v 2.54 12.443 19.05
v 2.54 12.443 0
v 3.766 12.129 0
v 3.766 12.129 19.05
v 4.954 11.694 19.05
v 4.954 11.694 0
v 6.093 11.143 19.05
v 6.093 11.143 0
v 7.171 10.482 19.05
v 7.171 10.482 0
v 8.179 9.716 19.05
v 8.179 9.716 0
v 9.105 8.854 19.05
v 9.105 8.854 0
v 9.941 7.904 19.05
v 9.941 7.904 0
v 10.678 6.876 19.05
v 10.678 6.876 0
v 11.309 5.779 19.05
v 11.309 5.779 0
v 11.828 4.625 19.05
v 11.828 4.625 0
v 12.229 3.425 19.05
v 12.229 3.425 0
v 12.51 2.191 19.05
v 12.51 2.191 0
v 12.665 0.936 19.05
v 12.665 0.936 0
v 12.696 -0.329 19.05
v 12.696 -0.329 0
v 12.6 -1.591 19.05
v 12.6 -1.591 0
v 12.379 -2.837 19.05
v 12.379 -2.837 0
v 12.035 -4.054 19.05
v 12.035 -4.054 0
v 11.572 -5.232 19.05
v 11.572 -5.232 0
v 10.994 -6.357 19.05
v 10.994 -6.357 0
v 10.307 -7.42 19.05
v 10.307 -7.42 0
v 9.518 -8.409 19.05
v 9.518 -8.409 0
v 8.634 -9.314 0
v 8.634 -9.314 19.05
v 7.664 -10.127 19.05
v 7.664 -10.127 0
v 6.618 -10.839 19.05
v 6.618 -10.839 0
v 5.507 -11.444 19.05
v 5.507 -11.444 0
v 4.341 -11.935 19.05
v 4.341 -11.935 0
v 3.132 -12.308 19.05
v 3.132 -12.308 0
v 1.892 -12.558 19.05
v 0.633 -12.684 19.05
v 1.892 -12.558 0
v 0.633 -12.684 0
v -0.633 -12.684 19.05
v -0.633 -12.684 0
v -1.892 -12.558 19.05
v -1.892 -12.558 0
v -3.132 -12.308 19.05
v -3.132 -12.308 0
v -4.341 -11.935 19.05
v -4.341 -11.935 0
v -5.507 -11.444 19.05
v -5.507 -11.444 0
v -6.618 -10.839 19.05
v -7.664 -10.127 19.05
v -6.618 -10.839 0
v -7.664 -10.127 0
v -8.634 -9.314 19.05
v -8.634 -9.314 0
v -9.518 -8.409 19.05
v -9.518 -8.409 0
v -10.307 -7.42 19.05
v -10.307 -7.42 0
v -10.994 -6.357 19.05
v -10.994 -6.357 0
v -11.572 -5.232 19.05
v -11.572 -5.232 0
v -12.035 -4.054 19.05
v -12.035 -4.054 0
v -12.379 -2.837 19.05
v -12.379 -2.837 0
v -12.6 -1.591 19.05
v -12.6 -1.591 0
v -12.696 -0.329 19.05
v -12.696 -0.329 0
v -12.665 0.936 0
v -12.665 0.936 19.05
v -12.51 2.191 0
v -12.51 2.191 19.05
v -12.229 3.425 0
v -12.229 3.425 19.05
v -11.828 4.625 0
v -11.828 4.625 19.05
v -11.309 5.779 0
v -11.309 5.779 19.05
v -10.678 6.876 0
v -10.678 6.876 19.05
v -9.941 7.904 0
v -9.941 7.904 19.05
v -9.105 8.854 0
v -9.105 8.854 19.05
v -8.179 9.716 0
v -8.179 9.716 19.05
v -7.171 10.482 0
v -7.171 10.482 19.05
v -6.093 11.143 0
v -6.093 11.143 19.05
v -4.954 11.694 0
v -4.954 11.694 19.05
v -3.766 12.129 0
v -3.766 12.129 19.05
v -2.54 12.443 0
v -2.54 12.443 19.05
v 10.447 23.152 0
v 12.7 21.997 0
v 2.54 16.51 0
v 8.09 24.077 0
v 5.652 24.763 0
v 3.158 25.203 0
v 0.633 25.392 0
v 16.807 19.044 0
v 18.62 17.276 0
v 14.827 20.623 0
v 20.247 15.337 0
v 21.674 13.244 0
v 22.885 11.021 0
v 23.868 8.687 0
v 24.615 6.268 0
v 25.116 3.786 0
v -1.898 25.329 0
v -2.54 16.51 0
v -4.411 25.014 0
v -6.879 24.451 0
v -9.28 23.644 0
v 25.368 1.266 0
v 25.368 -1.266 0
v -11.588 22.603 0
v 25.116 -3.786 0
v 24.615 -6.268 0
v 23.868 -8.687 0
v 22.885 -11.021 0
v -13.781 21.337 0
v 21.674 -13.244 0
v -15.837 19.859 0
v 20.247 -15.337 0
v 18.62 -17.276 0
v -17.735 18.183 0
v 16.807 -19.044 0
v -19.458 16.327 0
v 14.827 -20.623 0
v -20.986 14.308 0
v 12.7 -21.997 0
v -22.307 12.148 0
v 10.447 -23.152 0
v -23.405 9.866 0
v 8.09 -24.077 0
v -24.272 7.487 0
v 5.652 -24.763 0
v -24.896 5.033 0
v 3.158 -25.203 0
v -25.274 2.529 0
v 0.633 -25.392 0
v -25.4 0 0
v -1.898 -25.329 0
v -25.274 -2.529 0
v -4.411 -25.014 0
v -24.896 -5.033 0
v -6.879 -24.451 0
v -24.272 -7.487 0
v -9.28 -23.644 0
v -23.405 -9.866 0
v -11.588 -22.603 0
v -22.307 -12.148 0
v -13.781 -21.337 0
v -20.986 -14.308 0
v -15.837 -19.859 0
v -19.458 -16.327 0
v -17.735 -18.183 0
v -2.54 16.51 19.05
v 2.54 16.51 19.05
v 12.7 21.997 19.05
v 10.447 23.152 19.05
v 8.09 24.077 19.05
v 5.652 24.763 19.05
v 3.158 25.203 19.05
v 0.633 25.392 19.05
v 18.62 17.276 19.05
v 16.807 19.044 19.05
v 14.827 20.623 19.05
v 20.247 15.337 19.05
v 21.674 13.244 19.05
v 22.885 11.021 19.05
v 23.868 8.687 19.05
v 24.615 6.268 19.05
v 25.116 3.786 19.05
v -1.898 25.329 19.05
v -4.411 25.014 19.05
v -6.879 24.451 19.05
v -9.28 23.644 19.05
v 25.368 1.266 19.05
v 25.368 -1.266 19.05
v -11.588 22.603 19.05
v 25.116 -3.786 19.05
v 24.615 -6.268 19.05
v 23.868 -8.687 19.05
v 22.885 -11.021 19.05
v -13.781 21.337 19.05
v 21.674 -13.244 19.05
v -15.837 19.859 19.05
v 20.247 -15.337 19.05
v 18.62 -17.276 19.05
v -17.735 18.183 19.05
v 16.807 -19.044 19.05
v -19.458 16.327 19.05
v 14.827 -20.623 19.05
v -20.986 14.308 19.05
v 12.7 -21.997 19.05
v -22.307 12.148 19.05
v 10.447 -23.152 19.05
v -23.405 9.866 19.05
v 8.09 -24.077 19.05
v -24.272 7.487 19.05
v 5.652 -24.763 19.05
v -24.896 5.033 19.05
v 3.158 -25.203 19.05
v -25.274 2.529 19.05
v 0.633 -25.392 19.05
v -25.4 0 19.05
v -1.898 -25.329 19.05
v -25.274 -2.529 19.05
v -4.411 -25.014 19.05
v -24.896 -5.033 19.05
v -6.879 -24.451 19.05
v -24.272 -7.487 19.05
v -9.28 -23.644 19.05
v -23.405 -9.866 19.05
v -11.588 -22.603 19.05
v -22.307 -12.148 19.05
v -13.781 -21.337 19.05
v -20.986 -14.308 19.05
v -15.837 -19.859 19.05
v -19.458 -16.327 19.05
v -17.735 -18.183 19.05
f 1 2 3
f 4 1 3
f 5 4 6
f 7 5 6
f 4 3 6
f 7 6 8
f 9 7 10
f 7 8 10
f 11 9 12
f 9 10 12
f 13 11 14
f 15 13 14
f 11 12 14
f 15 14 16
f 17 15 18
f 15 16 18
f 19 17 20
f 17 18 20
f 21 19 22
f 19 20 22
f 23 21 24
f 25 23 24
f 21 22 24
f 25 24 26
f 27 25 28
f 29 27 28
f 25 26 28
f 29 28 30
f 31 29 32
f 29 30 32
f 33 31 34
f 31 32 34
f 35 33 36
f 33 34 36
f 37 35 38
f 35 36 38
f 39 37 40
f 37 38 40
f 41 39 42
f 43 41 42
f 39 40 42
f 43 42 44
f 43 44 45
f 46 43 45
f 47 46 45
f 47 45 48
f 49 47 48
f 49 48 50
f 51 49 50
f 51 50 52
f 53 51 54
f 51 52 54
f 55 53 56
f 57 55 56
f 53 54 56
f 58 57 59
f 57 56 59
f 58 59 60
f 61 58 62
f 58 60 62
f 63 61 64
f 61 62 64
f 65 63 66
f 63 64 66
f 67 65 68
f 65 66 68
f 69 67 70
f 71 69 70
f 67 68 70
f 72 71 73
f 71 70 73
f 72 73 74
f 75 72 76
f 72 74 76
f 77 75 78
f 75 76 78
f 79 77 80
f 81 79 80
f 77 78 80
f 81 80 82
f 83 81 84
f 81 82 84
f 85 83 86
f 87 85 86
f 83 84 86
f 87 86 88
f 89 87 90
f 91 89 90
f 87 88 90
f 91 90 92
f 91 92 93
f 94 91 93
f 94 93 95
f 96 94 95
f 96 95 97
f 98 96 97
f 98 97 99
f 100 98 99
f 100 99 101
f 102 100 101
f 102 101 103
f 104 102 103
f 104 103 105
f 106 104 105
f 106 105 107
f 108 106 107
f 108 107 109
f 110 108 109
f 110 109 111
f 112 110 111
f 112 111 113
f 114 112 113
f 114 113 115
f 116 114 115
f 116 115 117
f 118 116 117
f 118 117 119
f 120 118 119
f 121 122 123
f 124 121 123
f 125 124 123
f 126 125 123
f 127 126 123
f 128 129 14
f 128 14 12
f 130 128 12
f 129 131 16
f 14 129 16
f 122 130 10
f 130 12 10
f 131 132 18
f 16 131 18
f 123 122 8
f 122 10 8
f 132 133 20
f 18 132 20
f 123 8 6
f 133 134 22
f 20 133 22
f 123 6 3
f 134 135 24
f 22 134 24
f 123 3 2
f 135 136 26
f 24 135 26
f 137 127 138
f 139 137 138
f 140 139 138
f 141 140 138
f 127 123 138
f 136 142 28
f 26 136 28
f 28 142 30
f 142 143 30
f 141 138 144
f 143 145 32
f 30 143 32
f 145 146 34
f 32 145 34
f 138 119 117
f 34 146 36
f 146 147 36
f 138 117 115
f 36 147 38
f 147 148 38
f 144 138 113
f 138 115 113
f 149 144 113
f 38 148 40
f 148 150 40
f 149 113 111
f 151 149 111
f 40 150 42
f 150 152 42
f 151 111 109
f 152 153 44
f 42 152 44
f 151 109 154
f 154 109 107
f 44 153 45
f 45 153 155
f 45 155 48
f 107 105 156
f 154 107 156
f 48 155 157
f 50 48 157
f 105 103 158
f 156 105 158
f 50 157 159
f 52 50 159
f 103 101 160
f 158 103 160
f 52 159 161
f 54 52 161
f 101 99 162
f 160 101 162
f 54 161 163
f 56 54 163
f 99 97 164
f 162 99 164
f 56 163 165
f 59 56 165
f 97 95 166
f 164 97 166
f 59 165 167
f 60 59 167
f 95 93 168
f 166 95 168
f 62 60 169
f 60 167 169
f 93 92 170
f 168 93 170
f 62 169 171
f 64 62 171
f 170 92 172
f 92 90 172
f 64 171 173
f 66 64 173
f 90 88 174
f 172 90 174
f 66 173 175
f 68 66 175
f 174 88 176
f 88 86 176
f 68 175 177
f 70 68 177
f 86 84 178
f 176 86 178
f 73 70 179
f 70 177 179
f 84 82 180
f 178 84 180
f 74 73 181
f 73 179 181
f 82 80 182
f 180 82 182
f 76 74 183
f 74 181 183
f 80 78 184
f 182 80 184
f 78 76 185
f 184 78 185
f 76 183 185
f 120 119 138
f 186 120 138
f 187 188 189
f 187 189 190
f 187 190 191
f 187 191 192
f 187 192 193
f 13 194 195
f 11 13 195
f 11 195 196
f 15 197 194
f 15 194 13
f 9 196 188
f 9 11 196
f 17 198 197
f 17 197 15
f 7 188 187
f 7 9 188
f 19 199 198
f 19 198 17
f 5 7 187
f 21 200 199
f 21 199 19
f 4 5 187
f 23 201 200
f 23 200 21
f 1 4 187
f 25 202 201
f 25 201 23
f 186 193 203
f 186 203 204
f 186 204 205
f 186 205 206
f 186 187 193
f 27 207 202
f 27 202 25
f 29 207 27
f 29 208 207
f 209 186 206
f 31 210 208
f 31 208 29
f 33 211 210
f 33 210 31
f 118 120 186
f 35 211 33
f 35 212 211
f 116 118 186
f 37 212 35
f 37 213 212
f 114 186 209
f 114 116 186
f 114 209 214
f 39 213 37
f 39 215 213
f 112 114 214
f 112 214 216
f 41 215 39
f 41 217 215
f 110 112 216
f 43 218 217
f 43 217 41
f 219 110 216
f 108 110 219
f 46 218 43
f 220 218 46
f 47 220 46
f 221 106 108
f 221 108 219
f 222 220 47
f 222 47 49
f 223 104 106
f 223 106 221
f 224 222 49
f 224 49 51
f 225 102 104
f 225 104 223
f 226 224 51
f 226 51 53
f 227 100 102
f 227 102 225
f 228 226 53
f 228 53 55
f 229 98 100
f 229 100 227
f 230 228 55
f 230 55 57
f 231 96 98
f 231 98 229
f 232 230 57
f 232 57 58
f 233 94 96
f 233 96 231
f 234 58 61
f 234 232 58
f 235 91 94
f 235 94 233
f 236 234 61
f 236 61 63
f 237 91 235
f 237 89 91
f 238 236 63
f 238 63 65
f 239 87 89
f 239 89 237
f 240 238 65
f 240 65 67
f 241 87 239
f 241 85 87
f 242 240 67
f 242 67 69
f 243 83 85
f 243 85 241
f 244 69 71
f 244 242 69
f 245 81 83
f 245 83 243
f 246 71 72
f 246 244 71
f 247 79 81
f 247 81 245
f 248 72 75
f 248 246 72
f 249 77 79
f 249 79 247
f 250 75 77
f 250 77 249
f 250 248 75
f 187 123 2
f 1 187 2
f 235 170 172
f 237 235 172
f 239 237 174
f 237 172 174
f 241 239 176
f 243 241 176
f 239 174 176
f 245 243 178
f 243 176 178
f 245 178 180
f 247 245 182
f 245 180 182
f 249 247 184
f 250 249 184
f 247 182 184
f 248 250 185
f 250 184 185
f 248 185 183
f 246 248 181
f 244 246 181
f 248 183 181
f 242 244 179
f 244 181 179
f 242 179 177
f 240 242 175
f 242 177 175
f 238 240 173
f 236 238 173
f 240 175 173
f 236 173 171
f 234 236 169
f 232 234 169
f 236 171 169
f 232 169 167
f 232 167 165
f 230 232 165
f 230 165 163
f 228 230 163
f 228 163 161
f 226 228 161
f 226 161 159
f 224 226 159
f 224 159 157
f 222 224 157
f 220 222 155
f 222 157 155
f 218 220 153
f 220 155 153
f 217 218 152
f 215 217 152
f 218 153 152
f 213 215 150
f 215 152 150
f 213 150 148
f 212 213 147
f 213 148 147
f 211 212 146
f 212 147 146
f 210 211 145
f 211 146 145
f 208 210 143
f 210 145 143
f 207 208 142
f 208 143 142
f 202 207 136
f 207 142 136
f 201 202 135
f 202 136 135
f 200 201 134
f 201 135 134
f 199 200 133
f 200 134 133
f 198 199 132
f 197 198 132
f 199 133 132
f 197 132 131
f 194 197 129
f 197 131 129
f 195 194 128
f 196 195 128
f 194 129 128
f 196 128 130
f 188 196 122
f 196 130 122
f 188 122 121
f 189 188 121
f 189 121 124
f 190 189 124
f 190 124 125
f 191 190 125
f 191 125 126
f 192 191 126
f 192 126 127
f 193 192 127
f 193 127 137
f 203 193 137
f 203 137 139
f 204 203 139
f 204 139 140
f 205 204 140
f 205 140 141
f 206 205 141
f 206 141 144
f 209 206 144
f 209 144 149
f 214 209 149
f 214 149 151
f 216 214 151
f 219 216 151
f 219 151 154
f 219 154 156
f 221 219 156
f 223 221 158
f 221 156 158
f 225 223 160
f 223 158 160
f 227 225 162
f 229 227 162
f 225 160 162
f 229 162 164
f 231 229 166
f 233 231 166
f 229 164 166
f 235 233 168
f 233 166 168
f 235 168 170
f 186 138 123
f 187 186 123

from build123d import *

# Parameters (mm, degrees)
SKETCH3_R           = 25.4
BOSS_EXTRUDE1_DEPTH = 19.05


with BuildPart() as part:
    # Sketch3 → Boss-Extrude1 (new body)
    with BuildSketch(Plane.XY):
        with Locations(Location((0, 0, 0), (0, 0, 180))):
            Circle(SKETCH3_R)
        with BuildLine():
            Line((-2.54, 16.51), (2.54, 16.51))
            Line((2.54, 16.51), (2.54, 12.443407893))
            ThreePointArc((2.54, 12.443407893), (0, -12.7), (-2.54, 12.443407893))
            Line((-2.54, 12.443407893), (-2.54, 16.51))
        make_face(mode=Mode.SUBTRACT)
    extrude(amount=BOSS_EXTRUDE1_DEPTH)


solid = part.part
